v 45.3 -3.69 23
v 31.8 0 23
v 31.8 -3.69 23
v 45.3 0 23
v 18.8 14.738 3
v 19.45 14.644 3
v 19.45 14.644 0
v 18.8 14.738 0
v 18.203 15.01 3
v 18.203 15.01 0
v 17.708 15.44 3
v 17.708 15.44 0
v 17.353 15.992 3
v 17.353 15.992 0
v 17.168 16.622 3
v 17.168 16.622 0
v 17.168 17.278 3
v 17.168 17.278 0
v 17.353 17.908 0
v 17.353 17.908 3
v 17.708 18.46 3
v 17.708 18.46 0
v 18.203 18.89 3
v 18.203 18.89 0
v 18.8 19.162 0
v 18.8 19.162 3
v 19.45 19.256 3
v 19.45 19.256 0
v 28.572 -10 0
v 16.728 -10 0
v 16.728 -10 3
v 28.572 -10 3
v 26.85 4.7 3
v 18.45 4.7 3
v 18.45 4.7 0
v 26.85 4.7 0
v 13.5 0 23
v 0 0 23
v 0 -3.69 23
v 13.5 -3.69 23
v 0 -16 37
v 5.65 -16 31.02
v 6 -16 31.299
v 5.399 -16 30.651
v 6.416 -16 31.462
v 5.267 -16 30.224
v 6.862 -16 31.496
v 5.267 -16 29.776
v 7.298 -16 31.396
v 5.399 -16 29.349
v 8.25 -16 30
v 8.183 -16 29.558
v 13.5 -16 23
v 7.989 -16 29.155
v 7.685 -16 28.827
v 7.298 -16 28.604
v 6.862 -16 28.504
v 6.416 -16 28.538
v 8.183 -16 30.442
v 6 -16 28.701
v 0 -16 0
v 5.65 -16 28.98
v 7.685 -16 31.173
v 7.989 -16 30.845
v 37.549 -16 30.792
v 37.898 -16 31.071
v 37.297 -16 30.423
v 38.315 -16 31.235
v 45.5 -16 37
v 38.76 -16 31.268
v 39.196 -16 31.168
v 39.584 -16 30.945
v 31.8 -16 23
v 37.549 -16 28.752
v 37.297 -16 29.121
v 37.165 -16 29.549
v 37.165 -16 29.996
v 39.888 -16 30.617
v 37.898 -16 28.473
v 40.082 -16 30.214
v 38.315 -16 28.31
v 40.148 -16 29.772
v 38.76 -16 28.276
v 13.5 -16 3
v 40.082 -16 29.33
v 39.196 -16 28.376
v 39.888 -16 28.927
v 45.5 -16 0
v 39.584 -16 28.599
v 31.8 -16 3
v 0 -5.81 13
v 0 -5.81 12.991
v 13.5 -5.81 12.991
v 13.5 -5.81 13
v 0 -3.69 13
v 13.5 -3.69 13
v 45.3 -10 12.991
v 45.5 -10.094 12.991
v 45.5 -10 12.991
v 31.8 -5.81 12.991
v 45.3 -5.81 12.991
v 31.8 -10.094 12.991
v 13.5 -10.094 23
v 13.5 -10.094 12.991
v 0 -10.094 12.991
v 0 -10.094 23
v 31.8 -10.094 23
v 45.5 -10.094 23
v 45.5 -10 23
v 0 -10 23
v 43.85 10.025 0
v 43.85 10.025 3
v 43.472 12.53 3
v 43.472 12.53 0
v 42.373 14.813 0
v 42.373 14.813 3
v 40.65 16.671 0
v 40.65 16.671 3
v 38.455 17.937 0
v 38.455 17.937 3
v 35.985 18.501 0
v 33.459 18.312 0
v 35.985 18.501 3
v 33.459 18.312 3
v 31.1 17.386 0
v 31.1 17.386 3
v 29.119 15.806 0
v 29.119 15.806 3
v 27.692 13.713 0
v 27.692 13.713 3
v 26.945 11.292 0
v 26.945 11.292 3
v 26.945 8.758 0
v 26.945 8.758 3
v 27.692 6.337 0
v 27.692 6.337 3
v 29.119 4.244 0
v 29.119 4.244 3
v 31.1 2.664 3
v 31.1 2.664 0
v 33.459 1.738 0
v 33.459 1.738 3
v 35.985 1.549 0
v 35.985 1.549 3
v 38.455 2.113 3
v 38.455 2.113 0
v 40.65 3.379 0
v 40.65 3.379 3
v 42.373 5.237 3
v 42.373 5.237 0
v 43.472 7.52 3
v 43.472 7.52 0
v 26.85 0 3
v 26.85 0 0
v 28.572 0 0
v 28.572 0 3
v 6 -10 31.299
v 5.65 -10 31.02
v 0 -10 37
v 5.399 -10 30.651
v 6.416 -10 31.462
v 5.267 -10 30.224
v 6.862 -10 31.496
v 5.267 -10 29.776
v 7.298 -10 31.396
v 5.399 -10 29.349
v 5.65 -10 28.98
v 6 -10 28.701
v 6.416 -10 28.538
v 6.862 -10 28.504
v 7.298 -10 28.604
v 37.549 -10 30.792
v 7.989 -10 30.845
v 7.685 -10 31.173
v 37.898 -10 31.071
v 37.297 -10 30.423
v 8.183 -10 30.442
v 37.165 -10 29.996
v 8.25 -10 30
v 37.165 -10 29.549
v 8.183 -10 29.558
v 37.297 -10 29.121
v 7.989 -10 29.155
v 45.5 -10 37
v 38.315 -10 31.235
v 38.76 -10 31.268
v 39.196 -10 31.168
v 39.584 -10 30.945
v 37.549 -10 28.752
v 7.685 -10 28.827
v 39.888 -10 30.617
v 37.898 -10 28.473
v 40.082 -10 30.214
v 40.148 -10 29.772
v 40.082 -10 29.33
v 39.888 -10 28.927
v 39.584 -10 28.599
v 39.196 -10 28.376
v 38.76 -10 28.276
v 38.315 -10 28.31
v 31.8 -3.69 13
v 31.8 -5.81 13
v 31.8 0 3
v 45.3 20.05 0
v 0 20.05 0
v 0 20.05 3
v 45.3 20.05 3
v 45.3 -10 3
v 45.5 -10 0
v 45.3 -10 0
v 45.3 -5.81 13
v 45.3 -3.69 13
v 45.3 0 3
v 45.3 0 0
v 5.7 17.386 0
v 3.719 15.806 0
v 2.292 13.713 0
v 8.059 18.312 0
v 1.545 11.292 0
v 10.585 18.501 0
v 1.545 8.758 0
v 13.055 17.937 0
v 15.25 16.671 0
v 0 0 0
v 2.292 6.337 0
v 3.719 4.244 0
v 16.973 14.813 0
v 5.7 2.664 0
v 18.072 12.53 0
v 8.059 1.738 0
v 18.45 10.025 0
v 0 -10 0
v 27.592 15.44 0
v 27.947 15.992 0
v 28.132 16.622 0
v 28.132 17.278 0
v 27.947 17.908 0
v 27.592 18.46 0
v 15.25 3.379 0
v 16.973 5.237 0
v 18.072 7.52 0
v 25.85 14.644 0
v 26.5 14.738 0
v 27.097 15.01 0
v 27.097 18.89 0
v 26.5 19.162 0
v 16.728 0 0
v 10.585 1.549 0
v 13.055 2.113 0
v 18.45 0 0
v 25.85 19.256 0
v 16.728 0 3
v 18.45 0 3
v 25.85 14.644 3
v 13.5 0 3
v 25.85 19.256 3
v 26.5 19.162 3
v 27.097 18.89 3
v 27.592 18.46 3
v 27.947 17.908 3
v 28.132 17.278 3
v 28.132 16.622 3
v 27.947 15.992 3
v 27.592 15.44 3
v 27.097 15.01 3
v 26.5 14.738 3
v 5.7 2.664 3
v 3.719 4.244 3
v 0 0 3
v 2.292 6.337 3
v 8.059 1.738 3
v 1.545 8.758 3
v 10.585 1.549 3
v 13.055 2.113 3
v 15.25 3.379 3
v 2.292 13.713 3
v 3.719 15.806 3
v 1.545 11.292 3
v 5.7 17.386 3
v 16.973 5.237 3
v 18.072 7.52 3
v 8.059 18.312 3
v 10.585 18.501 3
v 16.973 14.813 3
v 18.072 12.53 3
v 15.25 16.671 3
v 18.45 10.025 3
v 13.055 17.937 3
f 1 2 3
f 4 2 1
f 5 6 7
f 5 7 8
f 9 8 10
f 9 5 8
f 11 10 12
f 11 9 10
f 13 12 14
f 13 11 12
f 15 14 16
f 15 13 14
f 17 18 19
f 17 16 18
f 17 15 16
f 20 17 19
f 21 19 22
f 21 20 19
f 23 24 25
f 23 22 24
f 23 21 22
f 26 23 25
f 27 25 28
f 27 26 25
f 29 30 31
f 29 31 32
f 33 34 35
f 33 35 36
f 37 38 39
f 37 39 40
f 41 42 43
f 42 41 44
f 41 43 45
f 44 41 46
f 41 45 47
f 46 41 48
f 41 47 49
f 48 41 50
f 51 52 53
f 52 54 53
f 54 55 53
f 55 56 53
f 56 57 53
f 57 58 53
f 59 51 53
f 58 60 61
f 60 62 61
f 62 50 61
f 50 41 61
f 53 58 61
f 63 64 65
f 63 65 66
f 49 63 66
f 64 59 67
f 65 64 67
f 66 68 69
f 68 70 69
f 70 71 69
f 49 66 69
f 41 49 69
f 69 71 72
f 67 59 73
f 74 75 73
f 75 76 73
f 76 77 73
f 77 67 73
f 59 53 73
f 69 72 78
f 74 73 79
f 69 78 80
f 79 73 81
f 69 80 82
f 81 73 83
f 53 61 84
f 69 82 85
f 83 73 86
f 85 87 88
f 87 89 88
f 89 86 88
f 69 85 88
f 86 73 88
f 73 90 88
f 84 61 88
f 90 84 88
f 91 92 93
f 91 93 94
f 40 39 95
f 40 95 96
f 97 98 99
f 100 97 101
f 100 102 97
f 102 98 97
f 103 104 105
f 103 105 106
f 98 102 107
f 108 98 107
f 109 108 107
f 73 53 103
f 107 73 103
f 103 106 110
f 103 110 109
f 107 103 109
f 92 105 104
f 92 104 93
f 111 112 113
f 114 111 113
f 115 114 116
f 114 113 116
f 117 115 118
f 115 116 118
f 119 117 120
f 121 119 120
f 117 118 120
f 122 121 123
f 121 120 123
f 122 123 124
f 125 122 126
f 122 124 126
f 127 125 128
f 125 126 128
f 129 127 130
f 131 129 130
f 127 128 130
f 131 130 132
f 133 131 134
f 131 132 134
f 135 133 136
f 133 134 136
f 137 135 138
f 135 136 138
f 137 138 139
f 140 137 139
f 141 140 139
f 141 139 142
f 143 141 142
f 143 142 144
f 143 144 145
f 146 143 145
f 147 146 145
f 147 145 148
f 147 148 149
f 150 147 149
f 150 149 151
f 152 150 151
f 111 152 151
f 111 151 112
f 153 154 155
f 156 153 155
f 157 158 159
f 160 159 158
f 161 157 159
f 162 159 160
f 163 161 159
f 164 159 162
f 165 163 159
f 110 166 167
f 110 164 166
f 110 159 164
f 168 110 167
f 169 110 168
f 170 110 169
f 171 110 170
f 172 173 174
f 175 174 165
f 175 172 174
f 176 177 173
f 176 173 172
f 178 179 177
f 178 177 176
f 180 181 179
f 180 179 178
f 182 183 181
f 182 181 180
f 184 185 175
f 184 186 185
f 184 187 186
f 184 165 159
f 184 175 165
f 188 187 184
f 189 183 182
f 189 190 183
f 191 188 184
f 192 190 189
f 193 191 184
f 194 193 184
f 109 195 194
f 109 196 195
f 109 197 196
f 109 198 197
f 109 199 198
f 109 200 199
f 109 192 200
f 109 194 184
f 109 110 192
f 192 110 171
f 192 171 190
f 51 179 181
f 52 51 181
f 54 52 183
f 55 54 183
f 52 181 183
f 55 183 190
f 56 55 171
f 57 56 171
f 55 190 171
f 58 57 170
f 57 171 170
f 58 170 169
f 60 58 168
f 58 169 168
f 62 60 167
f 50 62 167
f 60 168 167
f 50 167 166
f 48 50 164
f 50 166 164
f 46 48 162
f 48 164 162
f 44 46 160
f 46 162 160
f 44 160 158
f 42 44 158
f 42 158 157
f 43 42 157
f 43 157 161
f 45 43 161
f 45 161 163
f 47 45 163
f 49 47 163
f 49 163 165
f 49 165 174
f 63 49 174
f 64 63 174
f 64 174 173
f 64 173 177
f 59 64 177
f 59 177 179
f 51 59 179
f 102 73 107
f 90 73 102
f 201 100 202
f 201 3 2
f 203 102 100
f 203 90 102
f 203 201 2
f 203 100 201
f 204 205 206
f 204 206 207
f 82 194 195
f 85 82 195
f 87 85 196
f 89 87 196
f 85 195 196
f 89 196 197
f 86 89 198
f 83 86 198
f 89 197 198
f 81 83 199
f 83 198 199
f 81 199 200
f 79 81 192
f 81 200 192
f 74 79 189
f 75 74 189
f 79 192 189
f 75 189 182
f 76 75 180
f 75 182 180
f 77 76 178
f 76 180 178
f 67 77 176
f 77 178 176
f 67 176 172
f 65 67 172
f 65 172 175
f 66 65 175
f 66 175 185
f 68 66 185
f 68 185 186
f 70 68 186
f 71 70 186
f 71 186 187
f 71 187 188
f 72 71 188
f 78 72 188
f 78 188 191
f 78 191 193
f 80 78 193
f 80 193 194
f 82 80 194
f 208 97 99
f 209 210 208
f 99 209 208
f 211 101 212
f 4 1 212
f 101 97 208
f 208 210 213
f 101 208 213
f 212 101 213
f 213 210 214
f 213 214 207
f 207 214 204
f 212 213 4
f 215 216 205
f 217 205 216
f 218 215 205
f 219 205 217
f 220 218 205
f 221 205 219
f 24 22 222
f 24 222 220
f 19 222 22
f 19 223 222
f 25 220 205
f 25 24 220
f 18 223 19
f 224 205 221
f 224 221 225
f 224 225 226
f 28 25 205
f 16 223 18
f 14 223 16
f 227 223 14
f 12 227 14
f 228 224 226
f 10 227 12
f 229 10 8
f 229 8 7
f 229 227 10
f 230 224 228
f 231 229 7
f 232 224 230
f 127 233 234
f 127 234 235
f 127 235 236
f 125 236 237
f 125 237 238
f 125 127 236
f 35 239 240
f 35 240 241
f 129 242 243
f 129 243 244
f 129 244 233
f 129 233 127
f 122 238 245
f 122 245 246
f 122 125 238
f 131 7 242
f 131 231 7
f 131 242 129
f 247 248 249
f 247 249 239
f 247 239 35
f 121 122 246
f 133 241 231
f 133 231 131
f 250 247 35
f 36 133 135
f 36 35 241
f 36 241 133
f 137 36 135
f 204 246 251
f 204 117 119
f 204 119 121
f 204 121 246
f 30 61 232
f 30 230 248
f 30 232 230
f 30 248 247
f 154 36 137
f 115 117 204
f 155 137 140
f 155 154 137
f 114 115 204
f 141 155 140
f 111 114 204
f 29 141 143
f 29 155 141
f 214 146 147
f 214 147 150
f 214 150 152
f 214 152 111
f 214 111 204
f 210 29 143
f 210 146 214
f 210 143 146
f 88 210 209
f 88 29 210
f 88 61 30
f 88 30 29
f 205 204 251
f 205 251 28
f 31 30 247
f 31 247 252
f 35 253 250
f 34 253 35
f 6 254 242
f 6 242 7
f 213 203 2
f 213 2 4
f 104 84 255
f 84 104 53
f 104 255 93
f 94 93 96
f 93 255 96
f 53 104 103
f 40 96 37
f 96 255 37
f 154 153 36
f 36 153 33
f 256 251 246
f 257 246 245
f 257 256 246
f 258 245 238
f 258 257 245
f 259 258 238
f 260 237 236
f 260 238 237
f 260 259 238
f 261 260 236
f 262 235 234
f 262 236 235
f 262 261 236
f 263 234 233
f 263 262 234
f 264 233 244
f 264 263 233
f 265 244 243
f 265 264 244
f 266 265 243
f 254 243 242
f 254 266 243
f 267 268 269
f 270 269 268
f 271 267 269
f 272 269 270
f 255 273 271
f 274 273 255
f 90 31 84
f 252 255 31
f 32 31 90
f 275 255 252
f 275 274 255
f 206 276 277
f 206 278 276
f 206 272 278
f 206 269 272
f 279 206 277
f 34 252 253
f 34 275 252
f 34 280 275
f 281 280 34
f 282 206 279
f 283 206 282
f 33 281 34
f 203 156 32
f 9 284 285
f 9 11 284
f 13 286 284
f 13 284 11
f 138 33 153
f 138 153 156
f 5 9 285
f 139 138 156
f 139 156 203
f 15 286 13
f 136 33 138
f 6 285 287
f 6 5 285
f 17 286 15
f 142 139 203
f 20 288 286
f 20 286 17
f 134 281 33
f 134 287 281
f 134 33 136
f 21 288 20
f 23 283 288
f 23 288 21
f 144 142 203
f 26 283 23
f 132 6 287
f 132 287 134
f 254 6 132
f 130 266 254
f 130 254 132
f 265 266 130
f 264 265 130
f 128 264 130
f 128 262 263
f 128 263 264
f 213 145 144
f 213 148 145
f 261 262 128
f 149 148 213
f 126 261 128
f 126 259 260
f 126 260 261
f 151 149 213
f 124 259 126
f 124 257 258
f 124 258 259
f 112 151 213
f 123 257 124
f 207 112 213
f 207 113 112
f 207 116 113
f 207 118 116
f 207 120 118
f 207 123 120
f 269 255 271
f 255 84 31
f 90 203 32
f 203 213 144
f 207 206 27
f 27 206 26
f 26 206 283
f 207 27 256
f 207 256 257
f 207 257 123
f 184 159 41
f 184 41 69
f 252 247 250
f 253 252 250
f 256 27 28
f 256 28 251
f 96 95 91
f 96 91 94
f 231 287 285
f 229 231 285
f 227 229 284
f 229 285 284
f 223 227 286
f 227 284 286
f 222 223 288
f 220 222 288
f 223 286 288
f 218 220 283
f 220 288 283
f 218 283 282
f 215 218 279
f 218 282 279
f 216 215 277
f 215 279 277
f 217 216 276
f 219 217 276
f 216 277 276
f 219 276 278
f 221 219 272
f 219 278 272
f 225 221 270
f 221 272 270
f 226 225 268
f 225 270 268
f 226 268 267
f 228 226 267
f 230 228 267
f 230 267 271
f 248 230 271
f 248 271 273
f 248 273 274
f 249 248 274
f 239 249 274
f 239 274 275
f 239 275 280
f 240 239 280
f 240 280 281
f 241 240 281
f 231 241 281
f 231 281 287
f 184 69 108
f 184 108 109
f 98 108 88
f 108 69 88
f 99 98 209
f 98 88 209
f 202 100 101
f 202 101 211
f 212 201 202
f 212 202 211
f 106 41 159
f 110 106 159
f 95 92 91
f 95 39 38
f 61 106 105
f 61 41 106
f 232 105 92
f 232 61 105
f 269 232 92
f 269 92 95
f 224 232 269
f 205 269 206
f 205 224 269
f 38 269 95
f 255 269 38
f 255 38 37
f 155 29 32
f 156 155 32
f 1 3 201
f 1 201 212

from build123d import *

# Parameters (mm, degrees)
SKETCH1_W            = 45.3
SKETCH1_H            = 20.05
BOSS_EXTRUDE1_DEPTH  = 3
SKETCH2_R            = 8.5
CUT_EXTRUDE1_DEPTH   = 4
SKETCH3_W            = 8.4
SKETCH3_H            = 4.7
CUT_EXTRUDE2_DEPTH   = 1
SKETCH10_W           = 16.728431373
SKETCH10_H           = 3
BOSS_EXTRUDE8_DEPTH  = 10
SKETCH11_W           = 13.5
SKETCH11_H           = 10
BOSS_EXTRUDE9_DEPTH  = 20
SKETCH12_W           = 13.5
SKETCH12_H           = 2.12
CUT_EXTRUDE3_DEPTH   = 10
SKETCH13_W           = 13.5
SKETCH13_H           = 4
BOSS_EXTRUDE10_DEPTH = 6
SKETCH14_W           = 4
SKETCH14_H           = 3
BOSS_EXTRUDE11_DEPTH = 32
SKETCH15_W           = 32
SKETCH15_H           = 4
BOSS_EXTRUDE12_DEPTH = 3
SKETCH16_W           = 45.5
SKETCH16_H           = 6
BOSS_EXTRUDE13_DEPTH = 33
SKETCH17_W           = 18.3
SKETCH17_H           = 20
CUT_EXTRUDE4_DEPTH   = 7
SKETCH18_R           = 1.5
CUT_EXTRUDE5_DEPTH   = 7
SKETCH20_W           = 10.008836356
SKETCH20_H           = 4.284437553
CUT_EXTRUDE6_DEPTH   = 46.5
SKETCH21_W           = 8.4
SKETCH21_H           = 4.7
CUT_EXTRUDE7_DEPTH   = 3


with BuildPart() as part:
    # Sketch1 → Boss-Extrude1 (new body)
    with BuildSketch(Plane.XY):
        with Locations((22.65, 10.025)):
            Rectangle(SKETCH1_W, SKETCH1_H)
    extrude(amount=BOSS_EXTRUDE1_DEPTH)

    # Sketch2 → Cut-Extrude1 (cut, through all)
    with BuildSketch(Plane.XY.offset(3)):
        with Locations((9.95, 10.025)):
            Circle(SKETCH2_R)
        with Locations((35.35, 10.025)):
            Circle(SKETCH2_R)
        with BuildLine():
            Line((19.45, 19.255641391), (25.85, 19.255641391))
            ThreePointArc((25.85, 19.255641391), (28.155641391, 16.95), (25.85, 14.644358609))
            Line((25.85, 14.644358609), (19.45, 14.644358609))
            ThreePointArc((19.45, 14.644358609), (17.144358609, 16.95), (19.45, 19.255641391))
        make_face()
    extrude(amount=-CUT_EXTRUDE1_DEPTH, mode=Mode.SUBTRACT)

    # Sketch3 → Cut-Extrude2 (cut)
    with BuildSketch(Plane.XY.offset(3)):
        with Locations((22.65, 2.35)):
            Rectangle(SKETCH3_W, SKETCH3_H)
    extrude(amount=-CUT_EXTRUDE2_DEPTH, mode=Mode.SUBTRACT)

    # Sketch10 → Boss-Extrude8 (add)
    with BuildSketch(Plane.XZ):
        with Locations((8.364215686, 1.5)):
            Rectangle(SKETCH10_W, SKETCH10_H)
        with Locations((36.935784314, 1.5)):
            Rectangle(SKETCH10_W, SKETCH10_H)
    extrude(amount=BOSS_EXTRUDE8_DEPTH)

    # Sketch11 → Boss-Extrude9 (add)
    with BuildSketch(Plane.XY.offset(3)):
        with Locations((6.75, -5)):
            Rectangle(SKETCH11_W, SKETCH11_H)
        with Locations((38.55, -5)):
            Rectangle(SKETCH11_W, SKETCH11_H)
    extrude(amount=BOSS_EXTRUDE9_DEPTH)

    # Sketch12 → Cut-Extrude3 (cut)
    with BuildSketch(Plane.XY.offset(23)):
        with Locations((6.75, -4.750002431)):
            Rectangle(SKETCH12_W, SKETCH12_H)
        with Locations((38.55, -4.750002431)):
            Rectangle(SKETCH12_W, SKETCH12_H)
    extrude(amount=-CUT_EXTRUDE3_DEPTH, mode=Mode.SUBTRACT)

    # Sketch13 → Boss-Extrude10 (add)
    with BuildSketch(Plane.XZ.offset(10)):
        with Locations((6.75, 2)):
            Rectangle(SKETCH13_W, SKETCH13_H)
    extrude(amount=BOSS_EXTRUDE10_DEPTH)

    # Sketch14 → Boss-Extrude11 (add)
    with BuildSketch(Plane(origin=(13.5, 0, 0), x_dir=(0, 0, -1), z_dir=(1, 0, 0))):
        with Locations((-2, -14.5)):
            Rectangle(SKETCH14_W, SKETCH14_H)
    extrude(amount=BOSS_EXTRUDE11_DEPTH)

    # Sketch15 → Boss-Extrude12 (add)
    with BuildSketch(Plane(origin=(0, -13, 0), x_dir=(1, 0, 0), z_dir=(0, 1, 0))):
        with Locations((29.5, -2)):
            Rectangle(SKETCH15_W, SKETCH15_H)
    extrude(amount=BOSS_EXTRUDE12_DEPTH)

    # Sketch16 → Boss-Extrude13 (add)
    with BuildSketch(Plane.XY.offset(4)):
        with Locations((22.75, -13)):
            Rectangle(SKETCH16_W, SKETCH16_H)
    extrude(amount=BOSS_EXTRUDE13_DEPTH)

    # Sketch17 → Cut-Extrude4 (cut, through all)
    with BuildSketch(Plane(origin=(0, -10, 0), x_dir=(1, 0, 0), z_dir=(0, 1, 0))):
        with Locations((22.65, -13)):
            Rectangle(SKETCH17_W, SKETCH17_H)
    extrude(amount=-CUT_EXTRUDE4_DEPTH, mode=Mode.SUBTRACT)

    # Sketch18 → Cut-Extrude5 (cut, through all)
    with BuildSketch(Plane(origin=(0, -10, 0), x_dir=(1, 0, 0), z_dir=(0, 1, 0))):
        with Locations((6.75, -30)):
            Circle(SKETCH18_R)
        with Locations((38.648372532, -29.772154482)):
            Circle(SKETCH18_R)
    extrude(amount=-CUT_EXTRUDE5_DEPTH, mode=Mode.SUBTRACT)

    # Sketch20 → Cut-Extrude6 (cut, through all)
    with BuildSketch(Plane.ZY):
        with Locations((17.995581822, -7.952221208)):
            Rectangle(SKETCH20_W, SKETCH20_H)
    extrude(amount=-CUT_EXTRUDE6_DEPTH, mode=Mode.SUBTRACT)

    # Sketch21 → Cut-Extrude7 (cut, through all)
    with BuildSketch(Plane.XY.offset(2)):
        with Locations((22.65, 2.35)):
            Rectangle(SKETCH21_W, SKETCH21_H)
    extrude(amount=-CUT_EXTRUDE7_DEPTH, mode=Mode.SUBTRACT)


solid = part.part
